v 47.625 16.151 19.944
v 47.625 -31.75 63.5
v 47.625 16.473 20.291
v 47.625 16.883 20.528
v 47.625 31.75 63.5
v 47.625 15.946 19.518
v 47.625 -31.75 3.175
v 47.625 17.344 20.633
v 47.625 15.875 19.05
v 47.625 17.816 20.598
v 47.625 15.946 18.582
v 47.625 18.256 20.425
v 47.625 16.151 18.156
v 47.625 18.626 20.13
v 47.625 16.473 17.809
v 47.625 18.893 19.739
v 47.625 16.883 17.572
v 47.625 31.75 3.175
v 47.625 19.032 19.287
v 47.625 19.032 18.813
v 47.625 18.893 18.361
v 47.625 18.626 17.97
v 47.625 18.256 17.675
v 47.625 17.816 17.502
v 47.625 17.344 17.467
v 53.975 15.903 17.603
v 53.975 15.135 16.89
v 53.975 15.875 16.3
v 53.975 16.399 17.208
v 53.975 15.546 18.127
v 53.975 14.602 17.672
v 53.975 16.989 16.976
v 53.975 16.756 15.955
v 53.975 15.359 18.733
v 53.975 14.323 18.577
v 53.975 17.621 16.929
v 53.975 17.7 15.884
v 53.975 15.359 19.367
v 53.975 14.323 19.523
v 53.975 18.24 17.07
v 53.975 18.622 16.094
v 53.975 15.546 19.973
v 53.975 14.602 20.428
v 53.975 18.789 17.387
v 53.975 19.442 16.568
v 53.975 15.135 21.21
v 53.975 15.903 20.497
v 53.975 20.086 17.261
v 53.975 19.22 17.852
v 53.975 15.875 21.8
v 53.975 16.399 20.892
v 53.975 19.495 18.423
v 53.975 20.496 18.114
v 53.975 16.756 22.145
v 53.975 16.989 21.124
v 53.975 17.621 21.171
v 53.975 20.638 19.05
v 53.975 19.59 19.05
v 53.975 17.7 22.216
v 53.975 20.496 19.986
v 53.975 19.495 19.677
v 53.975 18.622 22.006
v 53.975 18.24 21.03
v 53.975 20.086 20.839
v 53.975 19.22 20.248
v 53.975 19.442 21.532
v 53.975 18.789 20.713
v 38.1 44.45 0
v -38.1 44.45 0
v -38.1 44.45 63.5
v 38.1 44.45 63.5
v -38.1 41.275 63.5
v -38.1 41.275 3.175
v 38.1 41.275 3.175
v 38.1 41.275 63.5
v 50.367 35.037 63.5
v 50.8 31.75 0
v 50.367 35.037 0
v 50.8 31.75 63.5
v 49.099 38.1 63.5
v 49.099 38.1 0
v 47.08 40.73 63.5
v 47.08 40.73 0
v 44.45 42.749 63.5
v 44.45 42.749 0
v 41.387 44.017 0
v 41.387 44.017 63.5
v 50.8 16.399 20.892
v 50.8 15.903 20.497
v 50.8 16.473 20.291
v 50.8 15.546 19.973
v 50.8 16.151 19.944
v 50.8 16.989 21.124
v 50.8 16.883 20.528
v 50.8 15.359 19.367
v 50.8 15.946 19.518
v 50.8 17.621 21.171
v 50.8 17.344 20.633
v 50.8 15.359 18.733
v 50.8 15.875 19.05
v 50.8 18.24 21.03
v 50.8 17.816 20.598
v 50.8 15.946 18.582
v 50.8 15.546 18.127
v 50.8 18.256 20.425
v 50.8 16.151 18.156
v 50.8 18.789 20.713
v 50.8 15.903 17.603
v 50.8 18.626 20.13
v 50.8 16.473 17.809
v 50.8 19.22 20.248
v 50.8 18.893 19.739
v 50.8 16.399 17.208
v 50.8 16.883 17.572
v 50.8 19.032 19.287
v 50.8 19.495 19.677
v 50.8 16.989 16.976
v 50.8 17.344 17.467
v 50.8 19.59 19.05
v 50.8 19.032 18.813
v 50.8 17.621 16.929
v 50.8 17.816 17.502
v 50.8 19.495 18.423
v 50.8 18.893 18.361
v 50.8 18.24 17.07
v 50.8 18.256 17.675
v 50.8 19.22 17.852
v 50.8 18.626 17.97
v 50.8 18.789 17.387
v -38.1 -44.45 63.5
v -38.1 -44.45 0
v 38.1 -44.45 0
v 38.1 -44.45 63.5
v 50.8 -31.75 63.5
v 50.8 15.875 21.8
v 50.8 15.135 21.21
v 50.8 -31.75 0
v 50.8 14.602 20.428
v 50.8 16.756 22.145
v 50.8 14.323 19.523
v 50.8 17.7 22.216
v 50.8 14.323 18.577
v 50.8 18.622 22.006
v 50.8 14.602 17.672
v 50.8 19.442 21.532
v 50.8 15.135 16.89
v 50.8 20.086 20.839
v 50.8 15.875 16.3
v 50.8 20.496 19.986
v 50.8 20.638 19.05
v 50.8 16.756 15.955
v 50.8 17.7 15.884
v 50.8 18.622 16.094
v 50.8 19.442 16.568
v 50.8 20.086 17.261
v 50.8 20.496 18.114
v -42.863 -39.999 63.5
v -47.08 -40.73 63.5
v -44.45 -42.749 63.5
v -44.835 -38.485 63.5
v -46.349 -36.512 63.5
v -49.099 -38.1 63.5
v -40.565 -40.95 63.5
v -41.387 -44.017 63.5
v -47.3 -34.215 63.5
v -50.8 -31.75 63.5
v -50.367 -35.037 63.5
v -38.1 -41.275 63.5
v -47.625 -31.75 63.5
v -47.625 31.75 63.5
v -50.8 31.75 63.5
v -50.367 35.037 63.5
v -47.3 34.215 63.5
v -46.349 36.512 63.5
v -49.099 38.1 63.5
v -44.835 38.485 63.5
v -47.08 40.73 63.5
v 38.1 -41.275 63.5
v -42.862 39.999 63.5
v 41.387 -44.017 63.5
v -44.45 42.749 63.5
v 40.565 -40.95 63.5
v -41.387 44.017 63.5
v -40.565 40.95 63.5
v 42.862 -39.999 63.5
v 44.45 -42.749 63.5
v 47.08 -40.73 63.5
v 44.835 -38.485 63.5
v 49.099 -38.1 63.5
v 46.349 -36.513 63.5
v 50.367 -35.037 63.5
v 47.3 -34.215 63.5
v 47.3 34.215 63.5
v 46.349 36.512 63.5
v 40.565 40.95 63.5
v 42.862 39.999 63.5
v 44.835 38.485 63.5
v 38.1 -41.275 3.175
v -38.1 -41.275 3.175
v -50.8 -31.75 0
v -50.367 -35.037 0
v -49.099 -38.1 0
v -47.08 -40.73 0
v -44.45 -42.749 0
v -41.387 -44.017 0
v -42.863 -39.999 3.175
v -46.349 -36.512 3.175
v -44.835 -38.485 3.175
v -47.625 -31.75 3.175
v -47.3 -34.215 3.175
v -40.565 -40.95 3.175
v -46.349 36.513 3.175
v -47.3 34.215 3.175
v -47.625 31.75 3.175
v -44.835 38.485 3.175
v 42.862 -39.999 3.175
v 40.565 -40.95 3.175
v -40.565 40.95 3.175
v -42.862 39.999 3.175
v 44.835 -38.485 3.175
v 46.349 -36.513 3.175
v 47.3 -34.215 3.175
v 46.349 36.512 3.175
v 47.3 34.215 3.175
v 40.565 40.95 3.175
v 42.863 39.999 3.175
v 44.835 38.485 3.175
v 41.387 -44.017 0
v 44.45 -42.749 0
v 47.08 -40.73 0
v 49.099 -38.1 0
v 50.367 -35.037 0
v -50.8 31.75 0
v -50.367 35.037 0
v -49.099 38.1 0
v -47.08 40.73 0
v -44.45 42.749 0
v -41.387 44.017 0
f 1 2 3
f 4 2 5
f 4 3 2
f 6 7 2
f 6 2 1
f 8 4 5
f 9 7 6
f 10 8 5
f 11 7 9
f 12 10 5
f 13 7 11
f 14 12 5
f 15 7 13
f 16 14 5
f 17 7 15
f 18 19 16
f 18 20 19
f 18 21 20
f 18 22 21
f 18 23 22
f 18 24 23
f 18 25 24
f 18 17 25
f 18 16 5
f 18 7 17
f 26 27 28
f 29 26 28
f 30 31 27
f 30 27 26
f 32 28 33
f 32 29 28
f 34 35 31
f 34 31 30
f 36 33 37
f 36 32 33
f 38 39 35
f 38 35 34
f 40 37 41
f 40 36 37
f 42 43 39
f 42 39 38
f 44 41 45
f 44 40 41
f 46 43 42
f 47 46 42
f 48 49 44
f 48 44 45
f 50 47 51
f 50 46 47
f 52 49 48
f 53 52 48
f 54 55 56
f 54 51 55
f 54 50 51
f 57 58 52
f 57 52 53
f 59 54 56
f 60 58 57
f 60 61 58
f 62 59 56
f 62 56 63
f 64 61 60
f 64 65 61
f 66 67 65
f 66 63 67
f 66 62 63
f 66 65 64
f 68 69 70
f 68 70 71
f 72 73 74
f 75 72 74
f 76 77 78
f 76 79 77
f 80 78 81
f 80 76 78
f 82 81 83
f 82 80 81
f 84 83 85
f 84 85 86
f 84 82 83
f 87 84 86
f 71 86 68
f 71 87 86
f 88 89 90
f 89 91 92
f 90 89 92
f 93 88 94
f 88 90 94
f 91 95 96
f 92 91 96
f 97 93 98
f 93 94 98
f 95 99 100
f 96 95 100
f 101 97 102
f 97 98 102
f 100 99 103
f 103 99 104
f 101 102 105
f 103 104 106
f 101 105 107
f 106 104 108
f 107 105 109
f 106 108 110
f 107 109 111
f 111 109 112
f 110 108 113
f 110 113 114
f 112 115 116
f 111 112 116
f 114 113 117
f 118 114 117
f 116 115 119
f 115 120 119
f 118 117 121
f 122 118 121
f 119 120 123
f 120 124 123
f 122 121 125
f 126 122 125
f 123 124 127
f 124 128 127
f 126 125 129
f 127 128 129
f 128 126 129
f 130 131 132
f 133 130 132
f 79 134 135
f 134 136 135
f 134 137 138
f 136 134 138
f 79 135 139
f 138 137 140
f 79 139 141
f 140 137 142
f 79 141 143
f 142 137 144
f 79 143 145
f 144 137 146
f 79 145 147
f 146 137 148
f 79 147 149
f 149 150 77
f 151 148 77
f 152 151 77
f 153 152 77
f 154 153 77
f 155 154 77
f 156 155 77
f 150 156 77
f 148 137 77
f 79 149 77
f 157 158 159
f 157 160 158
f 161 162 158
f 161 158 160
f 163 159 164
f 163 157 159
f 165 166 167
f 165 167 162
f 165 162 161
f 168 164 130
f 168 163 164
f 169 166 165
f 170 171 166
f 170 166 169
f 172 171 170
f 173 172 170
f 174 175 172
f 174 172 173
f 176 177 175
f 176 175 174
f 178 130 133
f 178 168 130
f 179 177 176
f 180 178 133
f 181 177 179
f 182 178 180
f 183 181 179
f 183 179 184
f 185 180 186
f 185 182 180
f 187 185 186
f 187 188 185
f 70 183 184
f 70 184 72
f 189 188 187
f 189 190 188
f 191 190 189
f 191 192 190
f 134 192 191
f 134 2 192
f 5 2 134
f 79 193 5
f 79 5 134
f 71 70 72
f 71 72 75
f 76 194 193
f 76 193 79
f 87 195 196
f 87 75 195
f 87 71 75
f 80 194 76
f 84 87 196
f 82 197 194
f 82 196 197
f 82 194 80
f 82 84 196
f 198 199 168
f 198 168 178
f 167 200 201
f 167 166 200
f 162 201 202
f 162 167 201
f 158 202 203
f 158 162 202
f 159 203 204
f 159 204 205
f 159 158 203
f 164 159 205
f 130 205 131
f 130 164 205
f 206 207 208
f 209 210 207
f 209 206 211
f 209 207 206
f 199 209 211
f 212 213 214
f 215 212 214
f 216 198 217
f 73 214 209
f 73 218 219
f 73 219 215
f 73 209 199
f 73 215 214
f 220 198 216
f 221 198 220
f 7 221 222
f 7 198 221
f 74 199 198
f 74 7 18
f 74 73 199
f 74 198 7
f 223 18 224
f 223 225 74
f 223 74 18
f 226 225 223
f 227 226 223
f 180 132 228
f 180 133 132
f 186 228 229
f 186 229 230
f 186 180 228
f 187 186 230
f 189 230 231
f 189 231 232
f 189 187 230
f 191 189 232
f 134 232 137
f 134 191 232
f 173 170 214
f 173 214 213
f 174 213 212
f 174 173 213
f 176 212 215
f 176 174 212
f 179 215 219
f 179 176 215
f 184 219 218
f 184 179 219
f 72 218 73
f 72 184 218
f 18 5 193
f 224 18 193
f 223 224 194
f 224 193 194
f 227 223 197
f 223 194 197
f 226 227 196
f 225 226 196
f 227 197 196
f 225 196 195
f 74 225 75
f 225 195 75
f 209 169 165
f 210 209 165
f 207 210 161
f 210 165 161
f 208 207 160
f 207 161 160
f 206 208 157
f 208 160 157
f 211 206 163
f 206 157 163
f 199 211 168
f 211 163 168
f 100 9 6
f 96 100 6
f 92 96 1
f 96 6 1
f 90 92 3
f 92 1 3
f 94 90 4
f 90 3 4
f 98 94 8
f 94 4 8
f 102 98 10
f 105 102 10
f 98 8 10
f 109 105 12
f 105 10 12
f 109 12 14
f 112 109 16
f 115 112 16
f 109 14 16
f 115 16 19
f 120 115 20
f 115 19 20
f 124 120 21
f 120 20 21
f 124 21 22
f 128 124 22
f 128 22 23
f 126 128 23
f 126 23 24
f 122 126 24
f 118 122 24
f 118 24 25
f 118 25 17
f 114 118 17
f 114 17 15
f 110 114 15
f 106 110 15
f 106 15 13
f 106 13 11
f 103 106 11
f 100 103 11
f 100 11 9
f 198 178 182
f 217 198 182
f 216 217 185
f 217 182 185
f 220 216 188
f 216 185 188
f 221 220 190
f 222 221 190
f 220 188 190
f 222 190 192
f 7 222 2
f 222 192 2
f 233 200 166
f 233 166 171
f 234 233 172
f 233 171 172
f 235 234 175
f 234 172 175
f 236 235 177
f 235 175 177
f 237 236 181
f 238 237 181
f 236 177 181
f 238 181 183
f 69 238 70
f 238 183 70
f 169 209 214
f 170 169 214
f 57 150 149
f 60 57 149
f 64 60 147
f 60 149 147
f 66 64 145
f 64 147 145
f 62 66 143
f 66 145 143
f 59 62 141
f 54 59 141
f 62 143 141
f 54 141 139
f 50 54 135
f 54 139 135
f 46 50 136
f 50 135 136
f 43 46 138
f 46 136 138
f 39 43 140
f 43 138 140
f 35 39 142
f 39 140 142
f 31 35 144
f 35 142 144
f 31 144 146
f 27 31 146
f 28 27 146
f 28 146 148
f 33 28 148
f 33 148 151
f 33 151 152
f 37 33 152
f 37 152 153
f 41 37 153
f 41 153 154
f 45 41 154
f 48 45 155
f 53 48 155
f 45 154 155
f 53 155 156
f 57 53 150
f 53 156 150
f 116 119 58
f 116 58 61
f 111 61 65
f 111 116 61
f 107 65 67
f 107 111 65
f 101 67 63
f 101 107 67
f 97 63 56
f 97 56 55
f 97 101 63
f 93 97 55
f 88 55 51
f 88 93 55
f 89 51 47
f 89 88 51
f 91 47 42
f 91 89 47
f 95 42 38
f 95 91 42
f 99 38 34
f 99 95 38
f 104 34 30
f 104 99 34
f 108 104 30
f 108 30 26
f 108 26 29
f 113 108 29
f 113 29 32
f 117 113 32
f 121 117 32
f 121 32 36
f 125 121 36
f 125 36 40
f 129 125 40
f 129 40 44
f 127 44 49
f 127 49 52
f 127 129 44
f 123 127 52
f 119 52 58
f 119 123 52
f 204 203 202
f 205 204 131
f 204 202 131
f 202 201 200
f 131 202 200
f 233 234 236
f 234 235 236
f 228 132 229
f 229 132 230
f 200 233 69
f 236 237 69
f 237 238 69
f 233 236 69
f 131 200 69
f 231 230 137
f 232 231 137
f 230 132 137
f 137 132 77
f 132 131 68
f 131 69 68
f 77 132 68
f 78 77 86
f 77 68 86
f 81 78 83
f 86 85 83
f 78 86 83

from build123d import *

# Parameters (mm, degrees)
F5_W     = 101.6
F5_H     = 88.9
F6_DEPTH = 63.5
F0_R     = 12.7
F1_T     = -3.175
F2_D     = 3.175
F2_DEPTH = 12.7
F3_R     = 3.175
F3_R_2   = 2.12725
F4_DEPTH = 3.175


with BuildPart() as f6:
    # F5 (on Top) → F6 (new body)
    with BuildSketch(Plane.XY):
        Rectangle(F5_W, F5_H)
    extrude(amount=F6_DEPTH)

    # F0
    f0_edges = [f6.edges().sort_by_distance(p)[0] for p in [
        (50.8, -44.45, 31.75),
        (50.8, 44.45, 31.75),
        (-50.8, -44.45, 31.75),
        (-50.8, 44.45, 31.75),
    ]]
    fillet(f0_edges, radius=F0_R)

    # F1
    f1_openings = [f6.faces().sort_by_distance(p)[0] for p in [
        (0, 0, 63.5),
    ]]
    offset(amount=F1_T, openings=f1_openings)

    # F2
    with Locations(Plane.YZ.offset(50.8)):
        with Locations((17.4625, 19.05)):
            Hole(F2_D / 2, depth=F2_DEPTH)

    # F3 (on face) → F4 (join)
    with BuildSketch(Plane.YZ.offset(50.8)):
        with Locations((17.4625, 19.05)):
            Circle(F3_R)
        with Locations((17.4625, 19.05)):
            Circle(F3_R_2, mode=Mode.SUBTRACT)
    extrude(amount=F4_DEPTH)


solid = f6.part
